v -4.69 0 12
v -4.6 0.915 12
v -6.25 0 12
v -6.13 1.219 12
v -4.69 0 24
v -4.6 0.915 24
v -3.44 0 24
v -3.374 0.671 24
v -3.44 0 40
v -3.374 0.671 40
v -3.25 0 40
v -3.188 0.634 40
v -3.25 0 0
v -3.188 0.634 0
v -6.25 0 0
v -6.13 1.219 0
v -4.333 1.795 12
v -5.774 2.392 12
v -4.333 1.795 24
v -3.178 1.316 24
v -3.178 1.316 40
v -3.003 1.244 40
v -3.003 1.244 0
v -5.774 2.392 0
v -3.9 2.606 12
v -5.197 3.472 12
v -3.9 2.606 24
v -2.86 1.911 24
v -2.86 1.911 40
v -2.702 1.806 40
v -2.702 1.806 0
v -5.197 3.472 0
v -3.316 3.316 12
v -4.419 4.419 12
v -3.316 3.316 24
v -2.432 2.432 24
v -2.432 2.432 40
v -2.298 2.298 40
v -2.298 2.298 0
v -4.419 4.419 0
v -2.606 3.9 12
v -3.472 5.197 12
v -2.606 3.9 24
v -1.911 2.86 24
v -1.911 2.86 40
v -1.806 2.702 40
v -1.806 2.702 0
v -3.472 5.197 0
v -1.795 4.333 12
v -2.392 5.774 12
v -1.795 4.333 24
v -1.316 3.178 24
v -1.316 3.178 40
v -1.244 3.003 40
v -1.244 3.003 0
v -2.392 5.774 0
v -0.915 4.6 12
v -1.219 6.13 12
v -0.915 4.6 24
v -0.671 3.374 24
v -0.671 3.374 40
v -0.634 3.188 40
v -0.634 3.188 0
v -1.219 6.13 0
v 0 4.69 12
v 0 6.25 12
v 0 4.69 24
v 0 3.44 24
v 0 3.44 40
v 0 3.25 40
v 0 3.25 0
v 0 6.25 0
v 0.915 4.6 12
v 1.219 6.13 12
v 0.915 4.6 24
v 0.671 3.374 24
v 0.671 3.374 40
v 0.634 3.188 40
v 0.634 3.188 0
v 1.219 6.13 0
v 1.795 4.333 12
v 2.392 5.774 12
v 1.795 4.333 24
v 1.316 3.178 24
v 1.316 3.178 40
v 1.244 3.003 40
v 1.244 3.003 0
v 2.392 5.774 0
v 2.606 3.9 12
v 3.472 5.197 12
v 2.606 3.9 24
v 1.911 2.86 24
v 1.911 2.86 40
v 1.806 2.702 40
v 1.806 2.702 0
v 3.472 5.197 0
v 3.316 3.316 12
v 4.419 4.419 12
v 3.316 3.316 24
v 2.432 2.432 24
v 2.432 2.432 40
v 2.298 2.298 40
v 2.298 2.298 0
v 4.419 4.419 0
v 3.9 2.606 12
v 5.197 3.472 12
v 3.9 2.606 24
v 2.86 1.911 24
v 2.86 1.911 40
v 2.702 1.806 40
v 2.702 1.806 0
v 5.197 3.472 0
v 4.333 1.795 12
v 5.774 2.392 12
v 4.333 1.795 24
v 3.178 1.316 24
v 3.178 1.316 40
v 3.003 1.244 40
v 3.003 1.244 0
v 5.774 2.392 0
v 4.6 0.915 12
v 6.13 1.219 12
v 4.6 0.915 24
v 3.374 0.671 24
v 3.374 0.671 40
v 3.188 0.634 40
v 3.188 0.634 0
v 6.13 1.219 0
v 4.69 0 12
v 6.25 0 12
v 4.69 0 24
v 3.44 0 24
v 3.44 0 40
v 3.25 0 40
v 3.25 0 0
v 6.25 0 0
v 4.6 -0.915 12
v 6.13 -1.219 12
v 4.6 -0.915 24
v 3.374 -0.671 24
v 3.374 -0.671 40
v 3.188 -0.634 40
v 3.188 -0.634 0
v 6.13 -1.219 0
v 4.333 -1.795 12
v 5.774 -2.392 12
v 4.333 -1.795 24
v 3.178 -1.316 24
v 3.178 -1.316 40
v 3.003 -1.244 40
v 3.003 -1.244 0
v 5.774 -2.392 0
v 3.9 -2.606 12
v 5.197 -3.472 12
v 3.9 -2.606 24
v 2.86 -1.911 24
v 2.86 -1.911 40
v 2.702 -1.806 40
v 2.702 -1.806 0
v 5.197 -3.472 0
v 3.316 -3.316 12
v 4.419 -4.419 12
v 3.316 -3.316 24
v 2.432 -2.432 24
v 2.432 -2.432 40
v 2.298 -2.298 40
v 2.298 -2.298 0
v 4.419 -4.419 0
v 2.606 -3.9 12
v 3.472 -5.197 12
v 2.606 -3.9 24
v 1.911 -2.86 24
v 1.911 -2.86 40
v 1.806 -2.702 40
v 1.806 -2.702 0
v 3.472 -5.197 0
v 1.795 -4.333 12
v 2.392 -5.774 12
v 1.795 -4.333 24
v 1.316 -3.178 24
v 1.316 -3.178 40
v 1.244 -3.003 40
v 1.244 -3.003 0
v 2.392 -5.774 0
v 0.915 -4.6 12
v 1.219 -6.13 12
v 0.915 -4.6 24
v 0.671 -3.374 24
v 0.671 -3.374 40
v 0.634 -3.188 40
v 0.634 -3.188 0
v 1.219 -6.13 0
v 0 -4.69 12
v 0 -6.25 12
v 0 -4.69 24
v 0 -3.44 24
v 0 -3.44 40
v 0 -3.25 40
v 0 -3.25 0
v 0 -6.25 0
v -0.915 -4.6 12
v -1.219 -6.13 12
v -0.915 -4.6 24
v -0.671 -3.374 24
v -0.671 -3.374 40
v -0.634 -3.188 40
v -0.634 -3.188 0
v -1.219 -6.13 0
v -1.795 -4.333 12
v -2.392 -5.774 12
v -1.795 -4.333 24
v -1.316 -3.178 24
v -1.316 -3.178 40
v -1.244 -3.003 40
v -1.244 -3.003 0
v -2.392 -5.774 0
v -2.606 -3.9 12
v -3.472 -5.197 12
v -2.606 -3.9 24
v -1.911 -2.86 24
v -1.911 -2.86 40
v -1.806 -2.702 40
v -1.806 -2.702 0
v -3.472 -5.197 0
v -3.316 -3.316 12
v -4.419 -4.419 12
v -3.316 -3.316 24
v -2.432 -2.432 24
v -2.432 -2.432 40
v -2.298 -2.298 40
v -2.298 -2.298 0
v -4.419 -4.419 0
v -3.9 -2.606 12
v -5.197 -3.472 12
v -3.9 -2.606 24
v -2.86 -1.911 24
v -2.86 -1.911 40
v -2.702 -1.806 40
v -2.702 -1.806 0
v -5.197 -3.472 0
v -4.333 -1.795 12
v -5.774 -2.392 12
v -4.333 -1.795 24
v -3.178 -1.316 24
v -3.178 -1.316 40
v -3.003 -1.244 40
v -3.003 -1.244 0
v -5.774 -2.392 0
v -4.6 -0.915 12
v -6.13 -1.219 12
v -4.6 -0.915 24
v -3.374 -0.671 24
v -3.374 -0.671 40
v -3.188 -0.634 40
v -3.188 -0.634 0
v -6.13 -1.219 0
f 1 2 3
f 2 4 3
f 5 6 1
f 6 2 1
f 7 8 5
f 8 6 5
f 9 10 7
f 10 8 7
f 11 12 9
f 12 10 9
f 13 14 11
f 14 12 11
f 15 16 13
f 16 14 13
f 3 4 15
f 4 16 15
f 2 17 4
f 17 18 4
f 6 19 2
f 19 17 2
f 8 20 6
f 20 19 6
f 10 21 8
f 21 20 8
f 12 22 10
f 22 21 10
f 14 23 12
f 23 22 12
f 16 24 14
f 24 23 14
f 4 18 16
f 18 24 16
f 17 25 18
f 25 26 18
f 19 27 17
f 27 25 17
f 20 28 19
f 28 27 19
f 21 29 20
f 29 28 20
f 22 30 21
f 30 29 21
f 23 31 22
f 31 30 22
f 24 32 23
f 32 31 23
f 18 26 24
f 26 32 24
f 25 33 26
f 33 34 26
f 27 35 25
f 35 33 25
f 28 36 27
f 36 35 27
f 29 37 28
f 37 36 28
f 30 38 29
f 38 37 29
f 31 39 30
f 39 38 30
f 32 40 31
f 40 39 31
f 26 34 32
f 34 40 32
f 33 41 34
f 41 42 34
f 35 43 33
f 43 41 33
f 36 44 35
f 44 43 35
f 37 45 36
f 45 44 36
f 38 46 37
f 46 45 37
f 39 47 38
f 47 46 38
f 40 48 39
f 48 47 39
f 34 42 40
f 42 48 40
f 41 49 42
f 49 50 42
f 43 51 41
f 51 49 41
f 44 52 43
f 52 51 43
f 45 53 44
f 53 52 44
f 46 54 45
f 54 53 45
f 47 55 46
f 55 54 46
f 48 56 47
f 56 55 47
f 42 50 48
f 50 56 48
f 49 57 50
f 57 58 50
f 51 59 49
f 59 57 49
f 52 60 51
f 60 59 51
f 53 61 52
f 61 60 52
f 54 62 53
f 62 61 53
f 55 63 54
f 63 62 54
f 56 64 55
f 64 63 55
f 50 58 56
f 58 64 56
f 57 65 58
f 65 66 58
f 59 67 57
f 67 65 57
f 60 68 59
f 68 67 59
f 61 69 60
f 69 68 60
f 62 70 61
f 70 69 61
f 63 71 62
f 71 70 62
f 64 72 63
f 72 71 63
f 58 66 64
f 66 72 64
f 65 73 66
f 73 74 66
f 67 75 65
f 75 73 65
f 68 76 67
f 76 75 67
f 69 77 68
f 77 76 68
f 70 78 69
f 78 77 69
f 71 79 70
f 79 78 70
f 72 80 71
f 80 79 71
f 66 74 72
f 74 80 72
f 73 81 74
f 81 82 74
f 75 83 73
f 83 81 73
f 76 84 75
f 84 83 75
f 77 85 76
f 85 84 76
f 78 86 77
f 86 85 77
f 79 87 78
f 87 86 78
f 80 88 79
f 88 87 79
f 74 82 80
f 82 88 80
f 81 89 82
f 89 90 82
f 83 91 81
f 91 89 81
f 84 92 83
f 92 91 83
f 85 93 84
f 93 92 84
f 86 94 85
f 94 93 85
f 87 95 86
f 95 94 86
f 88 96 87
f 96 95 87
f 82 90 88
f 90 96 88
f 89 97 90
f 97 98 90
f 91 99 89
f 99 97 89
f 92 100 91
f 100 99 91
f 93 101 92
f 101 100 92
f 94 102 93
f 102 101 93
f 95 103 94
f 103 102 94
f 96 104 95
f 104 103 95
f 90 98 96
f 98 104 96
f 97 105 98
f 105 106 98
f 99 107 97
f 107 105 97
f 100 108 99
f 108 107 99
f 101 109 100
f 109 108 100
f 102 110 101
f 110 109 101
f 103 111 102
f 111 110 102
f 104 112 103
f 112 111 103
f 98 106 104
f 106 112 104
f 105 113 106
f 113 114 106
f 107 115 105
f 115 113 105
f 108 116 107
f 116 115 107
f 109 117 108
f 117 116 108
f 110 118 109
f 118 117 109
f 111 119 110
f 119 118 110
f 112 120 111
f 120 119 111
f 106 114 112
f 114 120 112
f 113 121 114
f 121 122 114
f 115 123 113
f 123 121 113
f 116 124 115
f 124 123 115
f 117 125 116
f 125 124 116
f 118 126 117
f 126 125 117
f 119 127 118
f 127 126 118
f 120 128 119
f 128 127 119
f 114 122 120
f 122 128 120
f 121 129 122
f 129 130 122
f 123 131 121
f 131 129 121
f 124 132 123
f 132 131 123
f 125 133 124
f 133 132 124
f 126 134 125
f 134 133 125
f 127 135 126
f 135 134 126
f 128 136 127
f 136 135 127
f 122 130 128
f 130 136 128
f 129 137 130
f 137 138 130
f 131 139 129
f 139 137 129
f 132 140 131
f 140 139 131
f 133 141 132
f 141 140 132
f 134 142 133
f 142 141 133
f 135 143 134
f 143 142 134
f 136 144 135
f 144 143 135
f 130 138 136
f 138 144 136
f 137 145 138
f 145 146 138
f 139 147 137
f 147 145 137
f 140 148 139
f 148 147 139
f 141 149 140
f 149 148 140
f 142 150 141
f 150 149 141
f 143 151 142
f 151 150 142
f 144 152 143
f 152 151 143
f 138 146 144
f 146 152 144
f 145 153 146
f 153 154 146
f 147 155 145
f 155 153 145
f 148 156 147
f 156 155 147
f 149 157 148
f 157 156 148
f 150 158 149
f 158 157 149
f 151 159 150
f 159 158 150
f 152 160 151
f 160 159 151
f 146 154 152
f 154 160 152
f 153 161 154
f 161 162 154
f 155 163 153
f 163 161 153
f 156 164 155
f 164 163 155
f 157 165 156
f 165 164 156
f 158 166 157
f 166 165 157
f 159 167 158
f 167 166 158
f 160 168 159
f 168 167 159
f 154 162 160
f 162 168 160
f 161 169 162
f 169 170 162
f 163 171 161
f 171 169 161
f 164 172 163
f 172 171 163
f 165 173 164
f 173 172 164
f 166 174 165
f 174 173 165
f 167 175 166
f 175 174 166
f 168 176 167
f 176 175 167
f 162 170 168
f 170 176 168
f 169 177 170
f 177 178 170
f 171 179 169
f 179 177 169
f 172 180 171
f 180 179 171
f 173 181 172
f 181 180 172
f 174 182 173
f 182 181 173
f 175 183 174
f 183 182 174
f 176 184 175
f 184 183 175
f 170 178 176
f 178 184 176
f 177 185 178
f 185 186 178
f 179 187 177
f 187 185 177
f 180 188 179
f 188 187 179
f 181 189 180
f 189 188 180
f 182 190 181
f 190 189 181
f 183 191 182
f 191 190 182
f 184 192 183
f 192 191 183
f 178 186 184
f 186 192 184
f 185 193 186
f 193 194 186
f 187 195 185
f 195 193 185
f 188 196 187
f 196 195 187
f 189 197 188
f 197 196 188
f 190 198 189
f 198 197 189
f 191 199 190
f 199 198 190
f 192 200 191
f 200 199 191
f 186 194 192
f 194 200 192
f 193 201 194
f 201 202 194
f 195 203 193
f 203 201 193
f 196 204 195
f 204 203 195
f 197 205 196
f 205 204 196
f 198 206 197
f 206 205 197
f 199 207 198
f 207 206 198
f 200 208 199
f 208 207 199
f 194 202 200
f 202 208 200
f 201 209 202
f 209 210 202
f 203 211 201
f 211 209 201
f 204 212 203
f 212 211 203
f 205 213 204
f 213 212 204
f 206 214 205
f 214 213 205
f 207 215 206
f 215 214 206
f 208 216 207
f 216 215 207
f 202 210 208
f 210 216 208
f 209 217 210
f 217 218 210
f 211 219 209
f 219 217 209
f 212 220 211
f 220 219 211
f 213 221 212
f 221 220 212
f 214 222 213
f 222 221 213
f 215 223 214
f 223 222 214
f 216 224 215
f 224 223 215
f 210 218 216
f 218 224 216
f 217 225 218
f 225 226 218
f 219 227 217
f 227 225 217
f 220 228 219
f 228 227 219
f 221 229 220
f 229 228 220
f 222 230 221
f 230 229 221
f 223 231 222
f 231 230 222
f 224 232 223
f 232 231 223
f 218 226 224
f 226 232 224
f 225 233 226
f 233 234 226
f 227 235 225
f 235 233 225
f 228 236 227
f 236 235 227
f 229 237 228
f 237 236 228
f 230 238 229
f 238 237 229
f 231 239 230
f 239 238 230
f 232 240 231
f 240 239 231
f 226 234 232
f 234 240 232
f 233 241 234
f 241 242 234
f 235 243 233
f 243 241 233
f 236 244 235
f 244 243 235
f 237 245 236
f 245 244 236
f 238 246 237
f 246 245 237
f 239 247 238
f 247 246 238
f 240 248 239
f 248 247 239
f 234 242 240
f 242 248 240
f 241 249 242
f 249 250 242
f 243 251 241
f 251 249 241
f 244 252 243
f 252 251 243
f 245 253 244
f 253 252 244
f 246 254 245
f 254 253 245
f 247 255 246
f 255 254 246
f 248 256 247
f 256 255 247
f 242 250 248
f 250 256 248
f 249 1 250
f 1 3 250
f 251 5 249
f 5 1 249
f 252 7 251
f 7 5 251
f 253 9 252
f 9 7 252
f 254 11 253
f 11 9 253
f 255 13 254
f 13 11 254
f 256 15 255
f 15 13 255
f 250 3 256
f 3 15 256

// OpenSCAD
$fn = 32;

// ----------------------------------------------------------------------
// Profiled standoff: stepped spacer, 40 mm long, bore 6.5 mm
// ----------------------------------------------------------------------

// --- parameters (mm) ---
revolve_angle = 360;      // full turn around the Z axis
profile_points = 8;       // points of the closed outline

profile = [[3.25, 0], [6.25, 0], [6.25, 12], [4.69, 12], [4.69, 24], [3.44, 24], [3.44, 40], [3.25, 40]];  // single closed polygon, 8 points, counter clockwise

// --- the one profile operation ---
rotate_extrude(angle = revolve_angle) polygon(points = profile);
